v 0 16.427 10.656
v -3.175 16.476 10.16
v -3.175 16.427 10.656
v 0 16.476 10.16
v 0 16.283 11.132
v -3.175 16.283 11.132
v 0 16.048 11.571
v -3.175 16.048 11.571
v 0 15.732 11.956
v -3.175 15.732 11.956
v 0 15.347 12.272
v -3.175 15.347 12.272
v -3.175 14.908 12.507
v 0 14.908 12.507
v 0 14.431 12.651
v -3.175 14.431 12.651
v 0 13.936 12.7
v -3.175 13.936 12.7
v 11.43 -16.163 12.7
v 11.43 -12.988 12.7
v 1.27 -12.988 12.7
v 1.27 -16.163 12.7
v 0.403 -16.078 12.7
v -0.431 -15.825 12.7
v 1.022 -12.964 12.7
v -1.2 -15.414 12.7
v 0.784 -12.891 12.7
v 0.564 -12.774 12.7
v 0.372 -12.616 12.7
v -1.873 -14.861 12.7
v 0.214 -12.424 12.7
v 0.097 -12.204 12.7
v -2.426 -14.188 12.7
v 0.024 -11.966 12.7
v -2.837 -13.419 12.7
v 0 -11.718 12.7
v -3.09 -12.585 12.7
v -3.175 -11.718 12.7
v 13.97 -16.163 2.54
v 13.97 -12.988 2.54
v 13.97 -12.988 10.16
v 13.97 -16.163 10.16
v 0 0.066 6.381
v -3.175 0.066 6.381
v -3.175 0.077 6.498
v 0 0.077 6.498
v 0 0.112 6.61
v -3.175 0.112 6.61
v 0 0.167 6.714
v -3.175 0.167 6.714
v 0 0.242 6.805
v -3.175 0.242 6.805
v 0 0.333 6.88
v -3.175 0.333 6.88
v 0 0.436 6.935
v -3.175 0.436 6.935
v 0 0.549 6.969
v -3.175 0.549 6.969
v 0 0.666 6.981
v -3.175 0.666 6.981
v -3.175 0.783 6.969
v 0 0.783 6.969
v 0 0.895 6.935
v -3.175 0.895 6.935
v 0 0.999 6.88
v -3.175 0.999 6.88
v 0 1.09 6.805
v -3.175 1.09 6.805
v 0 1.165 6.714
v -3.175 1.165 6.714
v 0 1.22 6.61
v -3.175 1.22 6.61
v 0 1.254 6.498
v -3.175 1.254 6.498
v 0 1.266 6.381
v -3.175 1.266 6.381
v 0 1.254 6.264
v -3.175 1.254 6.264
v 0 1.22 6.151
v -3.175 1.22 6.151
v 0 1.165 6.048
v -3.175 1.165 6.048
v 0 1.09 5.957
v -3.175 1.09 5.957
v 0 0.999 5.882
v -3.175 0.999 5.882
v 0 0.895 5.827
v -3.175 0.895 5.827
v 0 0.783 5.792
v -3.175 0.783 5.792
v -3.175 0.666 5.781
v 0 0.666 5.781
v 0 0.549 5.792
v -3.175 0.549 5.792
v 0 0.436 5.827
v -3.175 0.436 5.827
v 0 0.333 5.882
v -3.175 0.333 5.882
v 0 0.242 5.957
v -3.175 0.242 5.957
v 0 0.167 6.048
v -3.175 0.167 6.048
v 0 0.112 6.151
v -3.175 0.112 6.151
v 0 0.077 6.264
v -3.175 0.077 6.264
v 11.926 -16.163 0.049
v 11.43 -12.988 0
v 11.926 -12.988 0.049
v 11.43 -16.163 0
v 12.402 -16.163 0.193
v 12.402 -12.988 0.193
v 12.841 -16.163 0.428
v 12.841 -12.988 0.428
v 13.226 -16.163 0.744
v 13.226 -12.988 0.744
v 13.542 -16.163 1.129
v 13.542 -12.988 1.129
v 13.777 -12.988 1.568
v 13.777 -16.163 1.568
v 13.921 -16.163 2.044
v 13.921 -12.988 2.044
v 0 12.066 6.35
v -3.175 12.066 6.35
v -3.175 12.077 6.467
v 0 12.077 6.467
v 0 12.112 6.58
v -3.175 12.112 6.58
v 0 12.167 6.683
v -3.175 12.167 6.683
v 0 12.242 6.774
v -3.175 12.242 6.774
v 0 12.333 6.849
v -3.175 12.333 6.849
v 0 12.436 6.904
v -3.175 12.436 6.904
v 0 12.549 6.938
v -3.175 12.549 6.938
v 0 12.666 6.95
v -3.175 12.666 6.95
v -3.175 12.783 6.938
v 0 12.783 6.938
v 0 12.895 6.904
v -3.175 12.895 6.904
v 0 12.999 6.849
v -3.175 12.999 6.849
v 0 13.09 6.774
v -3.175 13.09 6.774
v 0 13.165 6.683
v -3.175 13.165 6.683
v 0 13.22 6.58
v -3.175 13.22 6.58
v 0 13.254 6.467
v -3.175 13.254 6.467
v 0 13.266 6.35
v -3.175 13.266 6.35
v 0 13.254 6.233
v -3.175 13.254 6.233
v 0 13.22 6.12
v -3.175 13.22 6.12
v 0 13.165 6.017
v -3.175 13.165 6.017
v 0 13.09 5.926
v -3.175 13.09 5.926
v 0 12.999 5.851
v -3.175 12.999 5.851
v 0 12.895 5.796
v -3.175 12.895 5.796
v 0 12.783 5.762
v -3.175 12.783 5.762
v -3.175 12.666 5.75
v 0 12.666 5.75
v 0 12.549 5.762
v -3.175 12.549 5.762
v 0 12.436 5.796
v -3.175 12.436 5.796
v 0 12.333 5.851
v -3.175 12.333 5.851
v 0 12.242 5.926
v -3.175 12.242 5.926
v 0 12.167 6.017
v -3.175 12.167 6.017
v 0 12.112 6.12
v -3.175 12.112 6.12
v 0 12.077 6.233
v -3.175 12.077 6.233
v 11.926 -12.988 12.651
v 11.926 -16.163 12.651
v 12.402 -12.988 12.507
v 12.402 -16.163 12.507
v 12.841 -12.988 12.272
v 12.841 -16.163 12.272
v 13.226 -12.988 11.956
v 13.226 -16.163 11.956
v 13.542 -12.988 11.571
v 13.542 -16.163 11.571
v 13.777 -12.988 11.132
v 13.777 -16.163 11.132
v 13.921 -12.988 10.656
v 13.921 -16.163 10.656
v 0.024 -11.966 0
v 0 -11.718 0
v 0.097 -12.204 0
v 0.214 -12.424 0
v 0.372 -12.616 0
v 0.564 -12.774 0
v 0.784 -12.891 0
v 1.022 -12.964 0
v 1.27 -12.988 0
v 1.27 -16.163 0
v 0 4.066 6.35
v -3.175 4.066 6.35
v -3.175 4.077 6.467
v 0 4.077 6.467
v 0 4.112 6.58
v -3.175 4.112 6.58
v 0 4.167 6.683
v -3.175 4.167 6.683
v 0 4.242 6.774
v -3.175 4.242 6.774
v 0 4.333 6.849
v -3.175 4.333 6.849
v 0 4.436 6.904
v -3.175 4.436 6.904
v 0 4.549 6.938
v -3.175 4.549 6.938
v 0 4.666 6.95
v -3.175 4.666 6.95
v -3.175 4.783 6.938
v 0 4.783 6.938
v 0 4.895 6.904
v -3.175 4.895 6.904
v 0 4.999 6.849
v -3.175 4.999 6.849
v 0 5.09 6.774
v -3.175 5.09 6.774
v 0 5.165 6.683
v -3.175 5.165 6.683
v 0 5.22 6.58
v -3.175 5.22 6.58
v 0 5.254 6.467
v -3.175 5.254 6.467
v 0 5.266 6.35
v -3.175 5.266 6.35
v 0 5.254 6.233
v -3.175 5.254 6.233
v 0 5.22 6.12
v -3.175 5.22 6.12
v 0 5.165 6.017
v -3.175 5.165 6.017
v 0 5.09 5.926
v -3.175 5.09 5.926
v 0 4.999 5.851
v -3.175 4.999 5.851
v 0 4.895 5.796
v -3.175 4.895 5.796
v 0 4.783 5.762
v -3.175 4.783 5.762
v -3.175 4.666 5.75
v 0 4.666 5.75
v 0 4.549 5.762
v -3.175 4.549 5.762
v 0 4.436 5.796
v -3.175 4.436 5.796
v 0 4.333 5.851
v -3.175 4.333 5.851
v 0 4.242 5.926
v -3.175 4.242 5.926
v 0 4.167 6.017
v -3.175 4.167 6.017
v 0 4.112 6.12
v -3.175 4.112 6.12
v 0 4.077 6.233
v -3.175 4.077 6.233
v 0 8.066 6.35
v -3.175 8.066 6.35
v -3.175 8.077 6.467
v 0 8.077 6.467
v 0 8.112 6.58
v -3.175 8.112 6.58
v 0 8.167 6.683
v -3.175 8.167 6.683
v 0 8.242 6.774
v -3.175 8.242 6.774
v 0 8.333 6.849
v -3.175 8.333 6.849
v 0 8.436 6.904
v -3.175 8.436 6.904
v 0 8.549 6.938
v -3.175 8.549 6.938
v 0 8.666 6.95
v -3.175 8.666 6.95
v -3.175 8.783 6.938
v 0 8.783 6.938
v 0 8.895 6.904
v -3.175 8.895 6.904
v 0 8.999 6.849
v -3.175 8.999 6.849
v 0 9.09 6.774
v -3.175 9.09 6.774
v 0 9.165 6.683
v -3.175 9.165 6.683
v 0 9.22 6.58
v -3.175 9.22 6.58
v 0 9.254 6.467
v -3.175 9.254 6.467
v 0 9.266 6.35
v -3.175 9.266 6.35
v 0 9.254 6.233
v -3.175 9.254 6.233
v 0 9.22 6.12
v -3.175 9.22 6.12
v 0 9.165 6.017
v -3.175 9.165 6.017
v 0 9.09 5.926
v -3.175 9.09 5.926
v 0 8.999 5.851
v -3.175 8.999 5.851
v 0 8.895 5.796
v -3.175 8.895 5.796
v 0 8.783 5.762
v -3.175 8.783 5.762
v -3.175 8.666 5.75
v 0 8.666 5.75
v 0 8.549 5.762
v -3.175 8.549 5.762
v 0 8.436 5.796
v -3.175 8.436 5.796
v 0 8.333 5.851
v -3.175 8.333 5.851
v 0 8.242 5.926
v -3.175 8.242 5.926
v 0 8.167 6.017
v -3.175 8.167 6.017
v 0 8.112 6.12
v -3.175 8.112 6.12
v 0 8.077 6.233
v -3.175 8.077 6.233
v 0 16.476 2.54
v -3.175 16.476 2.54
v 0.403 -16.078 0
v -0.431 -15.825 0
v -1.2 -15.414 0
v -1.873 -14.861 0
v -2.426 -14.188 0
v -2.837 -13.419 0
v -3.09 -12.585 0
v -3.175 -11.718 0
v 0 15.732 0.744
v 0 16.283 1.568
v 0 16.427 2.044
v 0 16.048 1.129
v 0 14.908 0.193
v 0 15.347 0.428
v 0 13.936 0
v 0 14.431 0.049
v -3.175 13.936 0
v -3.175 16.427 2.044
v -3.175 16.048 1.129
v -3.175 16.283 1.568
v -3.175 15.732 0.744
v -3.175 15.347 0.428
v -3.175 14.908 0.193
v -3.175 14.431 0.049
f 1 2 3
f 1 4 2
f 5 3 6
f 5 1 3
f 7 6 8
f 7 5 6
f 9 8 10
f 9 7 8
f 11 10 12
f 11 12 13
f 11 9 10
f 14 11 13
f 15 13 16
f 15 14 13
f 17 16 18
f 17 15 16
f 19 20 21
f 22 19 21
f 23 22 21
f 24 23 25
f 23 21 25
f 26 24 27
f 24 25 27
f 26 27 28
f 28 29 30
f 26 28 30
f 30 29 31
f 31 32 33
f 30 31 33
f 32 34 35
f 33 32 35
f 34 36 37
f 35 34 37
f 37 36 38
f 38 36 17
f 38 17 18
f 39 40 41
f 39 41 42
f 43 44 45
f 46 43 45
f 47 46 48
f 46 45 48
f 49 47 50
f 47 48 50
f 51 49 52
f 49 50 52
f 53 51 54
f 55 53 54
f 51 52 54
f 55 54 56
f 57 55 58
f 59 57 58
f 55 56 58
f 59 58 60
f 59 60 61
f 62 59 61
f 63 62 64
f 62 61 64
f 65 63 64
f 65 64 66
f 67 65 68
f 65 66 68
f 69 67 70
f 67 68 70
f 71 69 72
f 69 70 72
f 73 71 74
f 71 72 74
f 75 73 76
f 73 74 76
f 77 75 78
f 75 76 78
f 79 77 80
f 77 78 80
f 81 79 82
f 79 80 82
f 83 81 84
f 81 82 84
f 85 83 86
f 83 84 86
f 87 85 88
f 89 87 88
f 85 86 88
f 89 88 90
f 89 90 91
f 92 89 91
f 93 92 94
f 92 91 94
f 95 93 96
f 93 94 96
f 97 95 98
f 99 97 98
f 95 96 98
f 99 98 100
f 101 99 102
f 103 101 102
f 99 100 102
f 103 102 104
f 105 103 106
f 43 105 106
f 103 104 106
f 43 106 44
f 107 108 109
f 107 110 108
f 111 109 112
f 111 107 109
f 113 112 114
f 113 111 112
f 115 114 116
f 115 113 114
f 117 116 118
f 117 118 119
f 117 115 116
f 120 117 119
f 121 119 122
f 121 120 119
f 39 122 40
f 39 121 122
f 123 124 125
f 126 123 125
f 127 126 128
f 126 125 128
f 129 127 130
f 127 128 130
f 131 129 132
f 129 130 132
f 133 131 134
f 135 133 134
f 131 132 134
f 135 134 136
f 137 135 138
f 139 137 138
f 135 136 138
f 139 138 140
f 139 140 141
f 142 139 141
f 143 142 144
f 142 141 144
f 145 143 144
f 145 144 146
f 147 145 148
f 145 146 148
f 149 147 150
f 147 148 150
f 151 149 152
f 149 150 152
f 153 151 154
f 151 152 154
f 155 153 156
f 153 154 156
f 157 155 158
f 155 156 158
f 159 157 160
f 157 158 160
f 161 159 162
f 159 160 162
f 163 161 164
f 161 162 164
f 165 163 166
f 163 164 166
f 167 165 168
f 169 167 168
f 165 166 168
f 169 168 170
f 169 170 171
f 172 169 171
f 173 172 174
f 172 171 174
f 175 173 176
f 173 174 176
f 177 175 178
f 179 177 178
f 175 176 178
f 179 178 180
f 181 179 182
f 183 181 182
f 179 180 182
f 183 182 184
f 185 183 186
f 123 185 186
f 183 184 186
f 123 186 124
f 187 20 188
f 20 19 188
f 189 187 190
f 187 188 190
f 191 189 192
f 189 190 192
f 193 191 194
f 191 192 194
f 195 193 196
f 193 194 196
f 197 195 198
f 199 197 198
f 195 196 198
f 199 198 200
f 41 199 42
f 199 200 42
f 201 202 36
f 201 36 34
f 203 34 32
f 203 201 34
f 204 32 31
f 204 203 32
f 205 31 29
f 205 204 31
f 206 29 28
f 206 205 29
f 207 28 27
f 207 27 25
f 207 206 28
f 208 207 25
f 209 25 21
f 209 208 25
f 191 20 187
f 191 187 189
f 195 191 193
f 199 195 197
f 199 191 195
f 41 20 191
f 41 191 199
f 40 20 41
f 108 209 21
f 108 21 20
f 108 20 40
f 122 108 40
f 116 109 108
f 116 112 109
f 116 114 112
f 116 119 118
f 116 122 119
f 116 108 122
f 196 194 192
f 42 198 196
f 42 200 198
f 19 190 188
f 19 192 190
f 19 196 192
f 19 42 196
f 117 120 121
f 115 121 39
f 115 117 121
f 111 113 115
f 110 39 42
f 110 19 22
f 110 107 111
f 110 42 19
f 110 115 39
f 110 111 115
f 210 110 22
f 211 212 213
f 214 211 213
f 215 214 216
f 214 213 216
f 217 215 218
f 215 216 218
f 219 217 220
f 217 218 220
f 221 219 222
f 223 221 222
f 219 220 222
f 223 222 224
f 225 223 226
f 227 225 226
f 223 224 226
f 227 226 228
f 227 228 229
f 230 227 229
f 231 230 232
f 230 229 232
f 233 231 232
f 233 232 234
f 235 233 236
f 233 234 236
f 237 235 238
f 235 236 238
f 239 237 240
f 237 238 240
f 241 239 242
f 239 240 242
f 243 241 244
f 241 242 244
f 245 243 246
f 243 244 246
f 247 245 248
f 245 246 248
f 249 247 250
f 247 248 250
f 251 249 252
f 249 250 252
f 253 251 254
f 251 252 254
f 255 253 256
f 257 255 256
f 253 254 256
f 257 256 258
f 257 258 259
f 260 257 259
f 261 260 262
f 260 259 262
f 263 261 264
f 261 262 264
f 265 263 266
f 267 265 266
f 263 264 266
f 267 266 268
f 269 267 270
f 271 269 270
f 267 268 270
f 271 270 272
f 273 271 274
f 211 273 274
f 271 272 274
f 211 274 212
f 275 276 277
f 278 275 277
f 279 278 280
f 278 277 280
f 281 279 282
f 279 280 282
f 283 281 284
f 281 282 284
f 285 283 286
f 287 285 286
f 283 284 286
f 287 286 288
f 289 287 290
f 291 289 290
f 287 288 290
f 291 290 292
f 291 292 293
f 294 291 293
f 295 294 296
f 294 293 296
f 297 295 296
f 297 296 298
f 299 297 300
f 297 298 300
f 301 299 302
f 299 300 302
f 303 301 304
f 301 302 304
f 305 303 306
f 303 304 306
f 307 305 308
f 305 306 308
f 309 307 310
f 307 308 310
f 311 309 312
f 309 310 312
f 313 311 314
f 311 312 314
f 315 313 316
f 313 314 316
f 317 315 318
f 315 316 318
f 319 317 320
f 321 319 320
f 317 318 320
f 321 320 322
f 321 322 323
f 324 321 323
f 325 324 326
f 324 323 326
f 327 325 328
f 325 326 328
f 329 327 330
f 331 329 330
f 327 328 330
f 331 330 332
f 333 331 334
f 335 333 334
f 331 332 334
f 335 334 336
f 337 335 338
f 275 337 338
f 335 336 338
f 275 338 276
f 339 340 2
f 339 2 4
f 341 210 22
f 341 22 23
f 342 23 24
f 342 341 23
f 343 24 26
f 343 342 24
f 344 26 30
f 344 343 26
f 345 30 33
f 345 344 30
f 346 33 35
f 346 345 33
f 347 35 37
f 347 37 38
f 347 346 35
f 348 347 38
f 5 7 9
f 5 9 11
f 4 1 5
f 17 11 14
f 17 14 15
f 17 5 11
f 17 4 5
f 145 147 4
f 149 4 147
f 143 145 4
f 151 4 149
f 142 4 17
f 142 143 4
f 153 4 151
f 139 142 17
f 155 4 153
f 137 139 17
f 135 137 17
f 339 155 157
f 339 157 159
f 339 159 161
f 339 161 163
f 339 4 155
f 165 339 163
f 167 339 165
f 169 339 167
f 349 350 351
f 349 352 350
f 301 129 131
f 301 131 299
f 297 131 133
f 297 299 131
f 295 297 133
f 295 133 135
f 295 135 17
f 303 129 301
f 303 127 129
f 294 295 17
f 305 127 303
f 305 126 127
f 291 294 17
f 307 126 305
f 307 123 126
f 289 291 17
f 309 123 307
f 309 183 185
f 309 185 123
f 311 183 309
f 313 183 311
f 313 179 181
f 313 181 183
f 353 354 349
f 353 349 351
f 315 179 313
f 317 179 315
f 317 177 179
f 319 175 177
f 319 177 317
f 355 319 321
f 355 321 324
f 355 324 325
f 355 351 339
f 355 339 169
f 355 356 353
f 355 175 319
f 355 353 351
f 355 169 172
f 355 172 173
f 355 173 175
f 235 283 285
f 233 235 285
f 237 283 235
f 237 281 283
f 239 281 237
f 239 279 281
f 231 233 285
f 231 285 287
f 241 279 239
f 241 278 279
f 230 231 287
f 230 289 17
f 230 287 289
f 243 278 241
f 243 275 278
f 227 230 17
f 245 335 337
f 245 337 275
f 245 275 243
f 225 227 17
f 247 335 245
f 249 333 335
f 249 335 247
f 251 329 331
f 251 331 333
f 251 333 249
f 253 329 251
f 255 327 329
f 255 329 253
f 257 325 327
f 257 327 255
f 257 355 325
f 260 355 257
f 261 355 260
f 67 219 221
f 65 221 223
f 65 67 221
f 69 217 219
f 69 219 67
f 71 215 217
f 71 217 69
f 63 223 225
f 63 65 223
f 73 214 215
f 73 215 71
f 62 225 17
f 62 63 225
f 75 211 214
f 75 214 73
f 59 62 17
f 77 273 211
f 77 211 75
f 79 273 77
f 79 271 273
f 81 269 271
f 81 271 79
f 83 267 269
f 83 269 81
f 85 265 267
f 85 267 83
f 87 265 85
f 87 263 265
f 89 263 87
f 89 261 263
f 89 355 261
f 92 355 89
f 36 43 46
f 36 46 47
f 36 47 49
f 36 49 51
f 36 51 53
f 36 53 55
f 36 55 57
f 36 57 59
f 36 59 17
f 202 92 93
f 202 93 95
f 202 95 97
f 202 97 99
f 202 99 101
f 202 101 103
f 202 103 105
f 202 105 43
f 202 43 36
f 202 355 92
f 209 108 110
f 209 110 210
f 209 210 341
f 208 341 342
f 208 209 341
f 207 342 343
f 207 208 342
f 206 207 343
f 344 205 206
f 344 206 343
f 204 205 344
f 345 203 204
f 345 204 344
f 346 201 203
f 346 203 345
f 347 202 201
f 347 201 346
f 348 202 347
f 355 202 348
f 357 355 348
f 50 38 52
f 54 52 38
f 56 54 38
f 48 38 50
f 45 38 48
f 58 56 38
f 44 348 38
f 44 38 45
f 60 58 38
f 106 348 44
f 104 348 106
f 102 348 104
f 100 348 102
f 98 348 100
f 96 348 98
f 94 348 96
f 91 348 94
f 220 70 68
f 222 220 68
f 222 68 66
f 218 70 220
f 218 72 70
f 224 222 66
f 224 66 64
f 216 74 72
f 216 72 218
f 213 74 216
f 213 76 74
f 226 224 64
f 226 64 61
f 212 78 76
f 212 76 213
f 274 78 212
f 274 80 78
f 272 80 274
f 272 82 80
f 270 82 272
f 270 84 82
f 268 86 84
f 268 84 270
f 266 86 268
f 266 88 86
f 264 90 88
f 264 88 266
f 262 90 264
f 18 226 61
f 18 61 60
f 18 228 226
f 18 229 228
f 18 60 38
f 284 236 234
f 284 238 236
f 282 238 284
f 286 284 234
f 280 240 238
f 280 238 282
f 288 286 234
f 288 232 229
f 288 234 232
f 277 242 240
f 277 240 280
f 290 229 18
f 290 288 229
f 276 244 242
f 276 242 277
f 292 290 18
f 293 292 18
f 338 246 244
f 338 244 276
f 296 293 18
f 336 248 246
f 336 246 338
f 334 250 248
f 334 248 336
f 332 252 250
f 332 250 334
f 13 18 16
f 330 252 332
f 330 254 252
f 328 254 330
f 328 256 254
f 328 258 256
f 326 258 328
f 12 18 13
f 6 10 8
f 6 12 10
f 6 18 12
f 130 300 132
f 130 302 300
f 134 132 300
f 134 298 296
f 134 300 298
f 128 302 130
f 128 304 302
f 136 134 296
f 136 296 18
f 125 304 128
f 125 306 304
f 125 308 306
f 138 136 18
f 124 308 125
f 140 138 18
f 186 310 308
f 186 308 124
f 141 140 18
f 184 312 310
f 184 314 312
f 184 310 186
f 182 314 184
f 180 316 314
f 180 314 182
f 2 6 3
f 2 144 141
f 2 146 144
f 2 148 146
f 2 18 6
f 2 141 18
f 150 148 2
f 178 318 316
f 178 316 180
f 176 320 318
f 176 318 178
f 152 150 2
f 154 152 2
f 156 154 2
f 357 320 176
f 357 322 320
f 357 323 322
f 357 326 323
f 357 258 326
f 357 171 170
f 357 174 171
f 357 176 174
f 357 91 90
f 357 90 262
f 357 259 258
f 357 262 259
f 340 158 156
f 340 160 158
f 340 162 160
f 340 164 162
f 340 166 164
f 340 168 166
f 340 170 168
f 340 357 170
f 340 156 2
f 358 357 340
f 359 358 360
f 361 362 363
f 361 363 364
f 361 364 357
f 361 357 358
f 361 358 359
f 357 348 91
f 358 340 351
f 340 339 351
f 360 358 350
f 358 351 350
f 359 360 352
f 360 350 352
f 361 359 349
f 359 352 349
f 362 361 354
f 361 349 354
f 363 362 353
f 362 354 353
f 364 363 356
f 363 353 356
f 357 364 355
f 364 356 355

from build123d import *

# Parameters (mm, degrees)
BOSS_EXTRUDE1_DEPTH = 12.7
CUT_EXTRUDE1_REACH  = 28.957
SKETCH2_R           = 0.6
FILLET1_R           = 2.54


with BuildPart() as part:
    # Sketch1 → Boss-Extrude1 (new body)
    with BuildSketch(Plane.XY):
        with BuildLine():
            Line((0, 16.475869837), (0, -11.718130163))
            ThreePointArc((0, -11.718130163), (0.371974388, -12.616155775), (1.27, -12.988130163))
            Line((1.27, -12.988130163), (13.97, -12.988130163))
            Line((13.97, -12.988130163), (13.97, -16.163130163))
            Line((13.97, -16.163130163), (1.27, -16.163130163))
            ThreePointArc((1.27, -16.163130163), (-1.873089642, -14.861219805), (-3.175, -11.718130163))
            Line((-3.175, -11.718130163), (-3.175, 16.475869837))
            Line((-3.175, 16.475869837), (0, 16.475869837))
        make_face()
    extrude(amount=BOSS_EXTRUDE1_DEPTH)

    # Sketch2 → Cut-Extrude1 (cut, up to next)
    with BuildSketch(Plane.ZY.offset(3.175), mode=Mode.PRIVATE) as cut_extrude1_sk1:
        with Locations((6.35, 12.665869837)):
            Circle(SKETCH2_R)
    cut_extrude1_tool1 = extrude(cut_extrude1_sk1.sketch, amount=-CUT_EXTRUDE1_REACH, mode=Mode.PRIVATE) & part.part
    # Sketch2 → Cut-Extrude1 (cut, up to next)
    with BuildSketch(Plane.ZY.offset(3.175), mode=Mode.PRIVATE) as cut_extrude1_sk2:
        with Locations((6.35, 8.665869837)):
            Circle(SKETCH2_R)
    cut_extrude1_tool2 = extrude(cut_extrude1_sk2.sketch, amount=-CUT_EXTRUDE1_REACH, mode=Mode.PRIVATE) & part.part
    # Sketch2 → Cut-Extrude1 (cut, up to next)
    with BuildSketch(Plane.ZY.offset(3.175), mode=Mode.PRIVATE) as cut_extrude1_sk3:
        with Locations((6.35, 4.665877837)):
            Circle(SKETCH2_R)
    cut_extrude1_tool3 = extrude(cut_extrude1_sk3.sketch, amount=-CUT_EXTRUDE1_REACH, mode=Mode.PRIVATE) & part.part
    # Sketch2 → Cut-Extrude1 (cut, up to next)
    with BuildSketch(Plane.ZY.offset(3.175), mode=Mode.PRIVATE) as cut_extrude1_sk4:
        with Locations((6.380886644, 0.665885837)):
            Circle(SKETCH2_R)
    cut_extrude1_tool4 = extrude(cut_extrude1_sk4.sketch, amount=-CUT_EXTRUDE1_REACH, mode=Mode.PRIVATE) & part.part
    add(cut_extrude1_tool1.solids().sort_by_distance((-3.175, 12.66587, 6.35))[0], mode=Mode.SUBTRACT)
    add(cut_extrude1_tool2.solids().sort_by_distance((-3.175, 8.66587, 6.35))[0], mode=Mode.SUBTRACT)
    add(cut_extrude1_tool3.solids().sort_by_distance((-3.175, 4.665878, 6.35))[0], mode=Mode.SUBTRACT)
    add(cut_extrude1_tool4.solids().sort_by_distance((-3.175, 0.665886, 6.380887))[0], mode=Mode.SUBTRACT)

    # Fillet1
    fillet1_edges = [part.edges().sort_by_distance(p)[0] for p in [
        (13.97, -14.575630163, 0),
        (13.97, -14.575630163, 12.7),
        (-1.5875, 16.475869837, 0),
        (-1.5875, 16.475869837, 12.7),
    ]]
    fillet(fillet1_edges, radius=FILLET1_R)


solid = part.part
